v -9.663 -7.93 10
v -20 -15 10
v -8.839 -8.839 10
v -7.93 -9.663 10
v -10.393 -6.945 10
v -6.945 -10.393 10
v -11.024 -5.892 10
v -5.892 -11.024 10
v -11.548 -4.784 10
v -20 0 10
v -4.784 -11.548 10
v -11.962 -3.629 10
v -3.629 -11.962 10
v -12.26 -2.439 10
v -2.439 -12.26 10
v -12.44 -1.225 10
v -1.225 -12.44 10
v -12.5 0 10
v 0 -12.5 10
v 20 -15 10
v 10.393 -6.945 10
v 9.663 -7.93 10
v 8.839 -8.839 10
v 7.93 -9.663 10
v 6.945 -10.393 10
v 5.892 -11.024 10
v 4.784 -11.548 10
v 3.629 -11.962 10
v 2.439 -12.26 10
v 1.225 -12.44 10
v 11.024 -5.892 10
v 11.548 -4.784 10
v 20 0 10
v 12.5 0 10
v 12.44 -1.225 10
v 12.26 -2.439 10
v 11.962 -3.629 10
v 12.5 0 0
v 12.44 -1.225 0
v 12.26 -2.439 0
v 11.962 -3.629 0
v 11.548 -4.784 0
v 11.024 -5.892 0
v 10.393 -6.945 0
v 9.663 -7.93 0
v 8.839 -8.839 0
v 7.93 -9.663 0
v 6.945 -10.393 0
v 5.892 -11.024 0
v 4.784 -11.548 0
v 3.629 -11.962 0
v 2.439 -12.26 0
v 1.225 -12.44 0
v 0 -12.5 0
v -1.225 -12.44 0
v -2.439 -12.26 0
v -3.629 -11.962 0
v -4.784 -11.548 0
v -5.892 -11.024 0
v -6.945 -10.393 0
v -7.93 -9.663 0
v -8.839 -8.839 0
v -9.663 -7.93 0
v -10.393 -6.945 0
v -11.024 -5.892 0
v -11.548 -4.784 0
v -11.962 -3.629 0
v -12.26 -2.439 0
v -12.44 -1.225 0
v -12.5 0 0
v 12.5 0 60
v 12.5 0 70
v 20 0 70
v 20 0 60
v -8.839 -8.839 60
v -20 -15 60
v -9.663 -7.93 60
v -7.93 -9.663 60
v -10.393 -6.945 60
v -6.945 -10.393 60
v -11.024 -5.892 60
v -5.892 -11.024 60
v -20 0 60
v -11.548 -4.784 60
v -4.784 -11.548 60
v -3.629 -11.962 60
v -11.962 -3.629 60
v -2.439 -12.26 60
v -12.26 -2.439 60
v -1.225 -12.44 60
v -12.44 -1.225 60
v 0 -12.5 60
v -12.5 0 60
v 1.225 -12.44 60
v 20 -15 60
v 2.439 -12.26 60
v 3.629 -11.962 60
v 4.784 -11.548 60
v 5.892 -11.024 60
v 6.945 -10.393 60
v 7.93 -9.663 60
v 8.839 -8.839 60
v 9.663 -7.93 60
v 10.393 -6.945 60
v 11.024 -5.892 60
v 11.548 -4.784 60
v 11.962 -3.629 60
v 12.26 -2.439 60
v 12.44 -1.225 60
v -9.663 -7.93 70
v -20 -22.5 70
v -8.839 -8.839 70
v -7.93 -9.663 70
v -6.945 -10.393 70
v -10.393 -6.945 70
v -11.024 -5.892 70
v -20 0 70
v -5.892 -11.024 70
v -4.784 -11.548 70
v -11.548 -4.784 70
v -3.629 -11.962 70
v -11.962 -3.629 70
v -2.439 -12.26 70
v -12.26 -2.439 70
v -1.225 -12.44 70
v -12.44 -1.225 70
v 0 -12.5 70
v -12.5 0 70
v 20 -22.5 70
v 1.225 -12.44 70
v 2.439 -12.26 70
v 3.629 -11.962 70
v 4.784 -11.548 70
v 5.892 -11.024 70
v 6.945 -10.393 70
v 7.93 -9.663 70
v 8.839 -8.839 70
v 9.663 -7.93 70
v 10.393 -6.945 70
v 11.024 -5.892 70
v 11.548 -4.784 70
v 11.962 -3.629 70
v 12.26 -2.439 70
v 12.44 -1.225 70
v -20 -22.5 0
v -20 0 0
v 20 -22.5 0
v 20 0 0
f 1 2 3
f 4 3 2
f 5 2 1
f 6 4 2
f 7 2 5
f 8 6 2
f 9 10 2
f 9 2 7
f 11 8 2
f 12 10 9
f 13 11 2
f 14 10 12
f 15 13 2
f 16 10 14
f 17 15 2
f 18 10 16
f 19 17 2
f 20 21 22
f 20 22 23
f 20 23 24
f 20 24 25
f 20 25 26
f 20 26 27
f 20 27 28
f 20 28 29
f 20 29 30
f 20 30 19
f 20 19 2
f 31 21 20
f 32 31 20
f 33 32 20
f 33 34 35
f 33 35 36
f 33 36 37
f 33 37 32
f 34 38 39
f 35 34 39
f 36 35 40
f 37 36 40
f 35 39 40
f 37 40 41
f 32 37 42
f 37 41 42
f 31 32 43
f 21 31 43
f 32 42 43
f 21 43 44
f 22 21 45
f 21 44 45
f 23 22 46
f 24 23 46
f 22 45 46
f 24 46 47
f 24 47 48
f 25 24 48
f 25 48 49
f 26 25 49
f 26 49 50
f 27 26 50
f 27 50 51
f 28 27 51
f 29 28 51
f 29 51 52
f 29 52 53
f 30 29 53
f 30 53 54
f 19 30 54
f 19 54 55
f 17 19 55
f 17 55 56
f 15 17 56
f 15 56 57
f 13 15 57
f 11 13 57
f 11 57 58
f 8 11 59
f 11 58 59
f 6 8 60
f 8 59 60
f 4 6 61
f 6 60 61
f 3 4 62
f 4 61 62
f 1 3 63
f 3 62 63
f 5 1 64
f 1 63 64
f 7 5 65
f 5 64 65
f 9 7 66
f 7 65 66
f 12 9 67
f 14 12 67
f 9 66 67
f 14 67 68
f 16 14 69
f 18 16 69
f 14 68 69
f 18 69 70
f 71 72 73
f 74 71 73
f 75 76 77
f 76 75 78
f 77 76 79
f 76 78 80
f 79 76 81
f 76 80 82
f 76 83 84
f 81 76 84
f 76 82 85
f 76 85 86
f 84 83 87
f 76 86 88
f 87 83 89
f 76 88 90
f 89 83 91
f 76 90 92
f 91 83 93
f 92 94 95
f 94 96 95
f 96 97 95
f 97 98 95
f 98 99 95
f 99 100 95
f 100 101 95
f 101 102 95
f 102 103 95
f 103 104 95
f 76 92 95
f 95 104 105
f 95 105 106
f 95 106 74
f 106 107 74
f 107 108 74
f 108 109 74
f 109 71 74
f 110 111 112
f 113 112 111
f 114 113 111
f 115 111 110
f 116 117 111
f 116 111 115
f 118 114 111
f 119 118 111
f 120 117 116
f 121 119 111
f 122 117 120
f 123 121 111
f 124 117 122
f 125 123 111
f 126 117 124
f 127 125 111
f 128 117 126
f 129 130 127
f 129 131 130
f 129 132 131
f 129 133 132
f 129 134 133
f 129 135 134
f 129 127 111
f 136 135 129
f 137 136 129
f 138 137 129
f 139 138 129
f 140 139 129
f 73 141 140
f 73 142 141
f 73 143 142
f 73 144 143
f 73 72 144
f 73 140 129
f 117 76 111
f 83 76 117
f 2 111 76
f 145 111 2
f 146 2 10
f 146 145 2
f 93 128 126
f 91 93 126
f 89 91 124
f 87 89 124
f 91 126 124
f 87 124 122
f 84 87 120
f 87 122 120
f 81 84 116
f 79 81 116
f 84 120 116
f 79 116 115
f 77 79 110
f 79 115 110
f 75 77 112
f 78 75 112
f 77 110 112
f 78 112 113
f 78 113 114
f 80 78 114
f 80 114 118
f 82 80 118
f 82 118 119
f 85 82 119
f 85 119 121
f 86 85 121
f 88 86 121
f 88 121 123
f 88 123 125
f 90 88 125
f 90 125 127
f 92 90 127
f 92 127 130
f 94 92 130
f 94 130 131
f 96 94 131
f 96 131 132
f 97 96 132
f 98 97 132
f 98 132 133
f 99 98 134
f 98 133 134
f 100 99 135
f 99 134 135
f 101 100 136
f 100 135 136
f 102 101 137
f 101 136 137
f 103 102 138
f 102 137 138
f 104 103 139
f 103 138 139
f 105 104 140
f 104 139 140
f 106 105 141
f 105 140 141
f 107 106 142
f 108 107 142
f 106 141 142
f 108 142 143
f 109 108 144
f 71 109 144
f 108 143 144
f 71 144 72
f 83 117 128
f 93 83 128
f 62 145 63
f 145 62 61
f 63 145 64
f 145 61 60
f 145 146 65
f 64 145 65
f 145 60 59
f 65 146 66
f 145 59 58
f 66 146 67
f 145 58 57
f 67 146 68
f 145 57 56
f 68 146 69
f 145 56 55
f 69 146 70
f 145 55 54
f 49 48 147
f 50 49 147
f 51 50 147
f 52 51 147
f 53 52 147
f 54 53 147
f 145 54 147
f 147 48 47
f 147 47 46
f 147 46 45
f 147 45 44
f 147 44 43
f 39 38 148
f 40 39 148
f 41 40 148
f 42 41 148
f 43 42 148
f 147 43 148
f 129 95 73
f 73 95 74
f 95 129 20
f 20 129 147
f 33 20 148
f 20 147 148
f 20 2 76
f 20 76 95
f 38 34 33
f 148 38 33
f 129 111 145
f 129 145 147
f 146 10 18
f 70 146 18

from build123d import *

# Parameters (mm, degrees)
SKETCH1_W           = 40
SKETCH1_H           = 45
BOSS_EXTRUDE1_DEPTH = 70
SKETCH2_R           = 12.5
CUT_EXTRUDE1_DEPTH  = 10
CUT_EXTRUDE2_START  = -10
SKETCH3_R           = 12.5
CUT_EXTRUDE2_DEPTH  = 10
SKETCH4_W           = 40
SKETCH4_H           = 22.5
CUT_EXTRUDE3_DEPTH  = 77.198753271
SKETCH5_W           = 40
SKETCH5_H           = 50
CUT_EXTRUDE4_DEPTH  = 15


with BuildPart() as part:
    # Sketch1 → Boss-Extrude1 (new body)
    with BuildSketch(Plane.XY):
        Rectangle(SKETCH1_W, SKETCH1_H)
    extrude(amount=BOSS_EXTRUDE1_DEPTH)

    # Sketch2 → Cut-Extrude1 (cut)
    with BuildSketch(Plane(origin=(0, 0, 0), x_dir=(-1, 0, 0), z_dir=(0, 0, -1))):
        Circle(SKETCH2_R)
    extrude(amount=-CUT_EXTRUDE1_DEPTH, mode=Mode.SUBTRACT)

    # Sketch3 → Cut-Extrude2 (cut)
    with BuildSketch(Plane.XY.offset(70).offset(CUT_EXTRUDE2_START)):
        Circle(SKETCH3_R)
    extrude(amount=CUT_EXTRUDE2_DEPTH, mode=Mode.SUBTRACT)

    # Sketch4 → Cut-Extrude3 (cut, through all)
    with BuildSketch(Plane.XY.offset(70)):
        with Locations((0, 11.25)):
            Rectangle(SKETCH4_W, SKETCH4_H)
    extrude(amount=-CUT_EXTRUDE3_DEPTH, mode=Mode.SUBTRACT)

    # Sketch5 → Cut-Extrude4 (cut)
    with BuildSketch(Plane(origin=(0, 0, 0), x_dir=(1, 0, 0), z_dir=(0, 1, 0))):
        with Locations((0, -35)):
            Rectangle(SKETCH5_W, SKETCH5_H)
    extrude(amount=-CUT_EXTRUDE4_DEPTH, mode=Mode.SUBTRACT)


solid = part.part
